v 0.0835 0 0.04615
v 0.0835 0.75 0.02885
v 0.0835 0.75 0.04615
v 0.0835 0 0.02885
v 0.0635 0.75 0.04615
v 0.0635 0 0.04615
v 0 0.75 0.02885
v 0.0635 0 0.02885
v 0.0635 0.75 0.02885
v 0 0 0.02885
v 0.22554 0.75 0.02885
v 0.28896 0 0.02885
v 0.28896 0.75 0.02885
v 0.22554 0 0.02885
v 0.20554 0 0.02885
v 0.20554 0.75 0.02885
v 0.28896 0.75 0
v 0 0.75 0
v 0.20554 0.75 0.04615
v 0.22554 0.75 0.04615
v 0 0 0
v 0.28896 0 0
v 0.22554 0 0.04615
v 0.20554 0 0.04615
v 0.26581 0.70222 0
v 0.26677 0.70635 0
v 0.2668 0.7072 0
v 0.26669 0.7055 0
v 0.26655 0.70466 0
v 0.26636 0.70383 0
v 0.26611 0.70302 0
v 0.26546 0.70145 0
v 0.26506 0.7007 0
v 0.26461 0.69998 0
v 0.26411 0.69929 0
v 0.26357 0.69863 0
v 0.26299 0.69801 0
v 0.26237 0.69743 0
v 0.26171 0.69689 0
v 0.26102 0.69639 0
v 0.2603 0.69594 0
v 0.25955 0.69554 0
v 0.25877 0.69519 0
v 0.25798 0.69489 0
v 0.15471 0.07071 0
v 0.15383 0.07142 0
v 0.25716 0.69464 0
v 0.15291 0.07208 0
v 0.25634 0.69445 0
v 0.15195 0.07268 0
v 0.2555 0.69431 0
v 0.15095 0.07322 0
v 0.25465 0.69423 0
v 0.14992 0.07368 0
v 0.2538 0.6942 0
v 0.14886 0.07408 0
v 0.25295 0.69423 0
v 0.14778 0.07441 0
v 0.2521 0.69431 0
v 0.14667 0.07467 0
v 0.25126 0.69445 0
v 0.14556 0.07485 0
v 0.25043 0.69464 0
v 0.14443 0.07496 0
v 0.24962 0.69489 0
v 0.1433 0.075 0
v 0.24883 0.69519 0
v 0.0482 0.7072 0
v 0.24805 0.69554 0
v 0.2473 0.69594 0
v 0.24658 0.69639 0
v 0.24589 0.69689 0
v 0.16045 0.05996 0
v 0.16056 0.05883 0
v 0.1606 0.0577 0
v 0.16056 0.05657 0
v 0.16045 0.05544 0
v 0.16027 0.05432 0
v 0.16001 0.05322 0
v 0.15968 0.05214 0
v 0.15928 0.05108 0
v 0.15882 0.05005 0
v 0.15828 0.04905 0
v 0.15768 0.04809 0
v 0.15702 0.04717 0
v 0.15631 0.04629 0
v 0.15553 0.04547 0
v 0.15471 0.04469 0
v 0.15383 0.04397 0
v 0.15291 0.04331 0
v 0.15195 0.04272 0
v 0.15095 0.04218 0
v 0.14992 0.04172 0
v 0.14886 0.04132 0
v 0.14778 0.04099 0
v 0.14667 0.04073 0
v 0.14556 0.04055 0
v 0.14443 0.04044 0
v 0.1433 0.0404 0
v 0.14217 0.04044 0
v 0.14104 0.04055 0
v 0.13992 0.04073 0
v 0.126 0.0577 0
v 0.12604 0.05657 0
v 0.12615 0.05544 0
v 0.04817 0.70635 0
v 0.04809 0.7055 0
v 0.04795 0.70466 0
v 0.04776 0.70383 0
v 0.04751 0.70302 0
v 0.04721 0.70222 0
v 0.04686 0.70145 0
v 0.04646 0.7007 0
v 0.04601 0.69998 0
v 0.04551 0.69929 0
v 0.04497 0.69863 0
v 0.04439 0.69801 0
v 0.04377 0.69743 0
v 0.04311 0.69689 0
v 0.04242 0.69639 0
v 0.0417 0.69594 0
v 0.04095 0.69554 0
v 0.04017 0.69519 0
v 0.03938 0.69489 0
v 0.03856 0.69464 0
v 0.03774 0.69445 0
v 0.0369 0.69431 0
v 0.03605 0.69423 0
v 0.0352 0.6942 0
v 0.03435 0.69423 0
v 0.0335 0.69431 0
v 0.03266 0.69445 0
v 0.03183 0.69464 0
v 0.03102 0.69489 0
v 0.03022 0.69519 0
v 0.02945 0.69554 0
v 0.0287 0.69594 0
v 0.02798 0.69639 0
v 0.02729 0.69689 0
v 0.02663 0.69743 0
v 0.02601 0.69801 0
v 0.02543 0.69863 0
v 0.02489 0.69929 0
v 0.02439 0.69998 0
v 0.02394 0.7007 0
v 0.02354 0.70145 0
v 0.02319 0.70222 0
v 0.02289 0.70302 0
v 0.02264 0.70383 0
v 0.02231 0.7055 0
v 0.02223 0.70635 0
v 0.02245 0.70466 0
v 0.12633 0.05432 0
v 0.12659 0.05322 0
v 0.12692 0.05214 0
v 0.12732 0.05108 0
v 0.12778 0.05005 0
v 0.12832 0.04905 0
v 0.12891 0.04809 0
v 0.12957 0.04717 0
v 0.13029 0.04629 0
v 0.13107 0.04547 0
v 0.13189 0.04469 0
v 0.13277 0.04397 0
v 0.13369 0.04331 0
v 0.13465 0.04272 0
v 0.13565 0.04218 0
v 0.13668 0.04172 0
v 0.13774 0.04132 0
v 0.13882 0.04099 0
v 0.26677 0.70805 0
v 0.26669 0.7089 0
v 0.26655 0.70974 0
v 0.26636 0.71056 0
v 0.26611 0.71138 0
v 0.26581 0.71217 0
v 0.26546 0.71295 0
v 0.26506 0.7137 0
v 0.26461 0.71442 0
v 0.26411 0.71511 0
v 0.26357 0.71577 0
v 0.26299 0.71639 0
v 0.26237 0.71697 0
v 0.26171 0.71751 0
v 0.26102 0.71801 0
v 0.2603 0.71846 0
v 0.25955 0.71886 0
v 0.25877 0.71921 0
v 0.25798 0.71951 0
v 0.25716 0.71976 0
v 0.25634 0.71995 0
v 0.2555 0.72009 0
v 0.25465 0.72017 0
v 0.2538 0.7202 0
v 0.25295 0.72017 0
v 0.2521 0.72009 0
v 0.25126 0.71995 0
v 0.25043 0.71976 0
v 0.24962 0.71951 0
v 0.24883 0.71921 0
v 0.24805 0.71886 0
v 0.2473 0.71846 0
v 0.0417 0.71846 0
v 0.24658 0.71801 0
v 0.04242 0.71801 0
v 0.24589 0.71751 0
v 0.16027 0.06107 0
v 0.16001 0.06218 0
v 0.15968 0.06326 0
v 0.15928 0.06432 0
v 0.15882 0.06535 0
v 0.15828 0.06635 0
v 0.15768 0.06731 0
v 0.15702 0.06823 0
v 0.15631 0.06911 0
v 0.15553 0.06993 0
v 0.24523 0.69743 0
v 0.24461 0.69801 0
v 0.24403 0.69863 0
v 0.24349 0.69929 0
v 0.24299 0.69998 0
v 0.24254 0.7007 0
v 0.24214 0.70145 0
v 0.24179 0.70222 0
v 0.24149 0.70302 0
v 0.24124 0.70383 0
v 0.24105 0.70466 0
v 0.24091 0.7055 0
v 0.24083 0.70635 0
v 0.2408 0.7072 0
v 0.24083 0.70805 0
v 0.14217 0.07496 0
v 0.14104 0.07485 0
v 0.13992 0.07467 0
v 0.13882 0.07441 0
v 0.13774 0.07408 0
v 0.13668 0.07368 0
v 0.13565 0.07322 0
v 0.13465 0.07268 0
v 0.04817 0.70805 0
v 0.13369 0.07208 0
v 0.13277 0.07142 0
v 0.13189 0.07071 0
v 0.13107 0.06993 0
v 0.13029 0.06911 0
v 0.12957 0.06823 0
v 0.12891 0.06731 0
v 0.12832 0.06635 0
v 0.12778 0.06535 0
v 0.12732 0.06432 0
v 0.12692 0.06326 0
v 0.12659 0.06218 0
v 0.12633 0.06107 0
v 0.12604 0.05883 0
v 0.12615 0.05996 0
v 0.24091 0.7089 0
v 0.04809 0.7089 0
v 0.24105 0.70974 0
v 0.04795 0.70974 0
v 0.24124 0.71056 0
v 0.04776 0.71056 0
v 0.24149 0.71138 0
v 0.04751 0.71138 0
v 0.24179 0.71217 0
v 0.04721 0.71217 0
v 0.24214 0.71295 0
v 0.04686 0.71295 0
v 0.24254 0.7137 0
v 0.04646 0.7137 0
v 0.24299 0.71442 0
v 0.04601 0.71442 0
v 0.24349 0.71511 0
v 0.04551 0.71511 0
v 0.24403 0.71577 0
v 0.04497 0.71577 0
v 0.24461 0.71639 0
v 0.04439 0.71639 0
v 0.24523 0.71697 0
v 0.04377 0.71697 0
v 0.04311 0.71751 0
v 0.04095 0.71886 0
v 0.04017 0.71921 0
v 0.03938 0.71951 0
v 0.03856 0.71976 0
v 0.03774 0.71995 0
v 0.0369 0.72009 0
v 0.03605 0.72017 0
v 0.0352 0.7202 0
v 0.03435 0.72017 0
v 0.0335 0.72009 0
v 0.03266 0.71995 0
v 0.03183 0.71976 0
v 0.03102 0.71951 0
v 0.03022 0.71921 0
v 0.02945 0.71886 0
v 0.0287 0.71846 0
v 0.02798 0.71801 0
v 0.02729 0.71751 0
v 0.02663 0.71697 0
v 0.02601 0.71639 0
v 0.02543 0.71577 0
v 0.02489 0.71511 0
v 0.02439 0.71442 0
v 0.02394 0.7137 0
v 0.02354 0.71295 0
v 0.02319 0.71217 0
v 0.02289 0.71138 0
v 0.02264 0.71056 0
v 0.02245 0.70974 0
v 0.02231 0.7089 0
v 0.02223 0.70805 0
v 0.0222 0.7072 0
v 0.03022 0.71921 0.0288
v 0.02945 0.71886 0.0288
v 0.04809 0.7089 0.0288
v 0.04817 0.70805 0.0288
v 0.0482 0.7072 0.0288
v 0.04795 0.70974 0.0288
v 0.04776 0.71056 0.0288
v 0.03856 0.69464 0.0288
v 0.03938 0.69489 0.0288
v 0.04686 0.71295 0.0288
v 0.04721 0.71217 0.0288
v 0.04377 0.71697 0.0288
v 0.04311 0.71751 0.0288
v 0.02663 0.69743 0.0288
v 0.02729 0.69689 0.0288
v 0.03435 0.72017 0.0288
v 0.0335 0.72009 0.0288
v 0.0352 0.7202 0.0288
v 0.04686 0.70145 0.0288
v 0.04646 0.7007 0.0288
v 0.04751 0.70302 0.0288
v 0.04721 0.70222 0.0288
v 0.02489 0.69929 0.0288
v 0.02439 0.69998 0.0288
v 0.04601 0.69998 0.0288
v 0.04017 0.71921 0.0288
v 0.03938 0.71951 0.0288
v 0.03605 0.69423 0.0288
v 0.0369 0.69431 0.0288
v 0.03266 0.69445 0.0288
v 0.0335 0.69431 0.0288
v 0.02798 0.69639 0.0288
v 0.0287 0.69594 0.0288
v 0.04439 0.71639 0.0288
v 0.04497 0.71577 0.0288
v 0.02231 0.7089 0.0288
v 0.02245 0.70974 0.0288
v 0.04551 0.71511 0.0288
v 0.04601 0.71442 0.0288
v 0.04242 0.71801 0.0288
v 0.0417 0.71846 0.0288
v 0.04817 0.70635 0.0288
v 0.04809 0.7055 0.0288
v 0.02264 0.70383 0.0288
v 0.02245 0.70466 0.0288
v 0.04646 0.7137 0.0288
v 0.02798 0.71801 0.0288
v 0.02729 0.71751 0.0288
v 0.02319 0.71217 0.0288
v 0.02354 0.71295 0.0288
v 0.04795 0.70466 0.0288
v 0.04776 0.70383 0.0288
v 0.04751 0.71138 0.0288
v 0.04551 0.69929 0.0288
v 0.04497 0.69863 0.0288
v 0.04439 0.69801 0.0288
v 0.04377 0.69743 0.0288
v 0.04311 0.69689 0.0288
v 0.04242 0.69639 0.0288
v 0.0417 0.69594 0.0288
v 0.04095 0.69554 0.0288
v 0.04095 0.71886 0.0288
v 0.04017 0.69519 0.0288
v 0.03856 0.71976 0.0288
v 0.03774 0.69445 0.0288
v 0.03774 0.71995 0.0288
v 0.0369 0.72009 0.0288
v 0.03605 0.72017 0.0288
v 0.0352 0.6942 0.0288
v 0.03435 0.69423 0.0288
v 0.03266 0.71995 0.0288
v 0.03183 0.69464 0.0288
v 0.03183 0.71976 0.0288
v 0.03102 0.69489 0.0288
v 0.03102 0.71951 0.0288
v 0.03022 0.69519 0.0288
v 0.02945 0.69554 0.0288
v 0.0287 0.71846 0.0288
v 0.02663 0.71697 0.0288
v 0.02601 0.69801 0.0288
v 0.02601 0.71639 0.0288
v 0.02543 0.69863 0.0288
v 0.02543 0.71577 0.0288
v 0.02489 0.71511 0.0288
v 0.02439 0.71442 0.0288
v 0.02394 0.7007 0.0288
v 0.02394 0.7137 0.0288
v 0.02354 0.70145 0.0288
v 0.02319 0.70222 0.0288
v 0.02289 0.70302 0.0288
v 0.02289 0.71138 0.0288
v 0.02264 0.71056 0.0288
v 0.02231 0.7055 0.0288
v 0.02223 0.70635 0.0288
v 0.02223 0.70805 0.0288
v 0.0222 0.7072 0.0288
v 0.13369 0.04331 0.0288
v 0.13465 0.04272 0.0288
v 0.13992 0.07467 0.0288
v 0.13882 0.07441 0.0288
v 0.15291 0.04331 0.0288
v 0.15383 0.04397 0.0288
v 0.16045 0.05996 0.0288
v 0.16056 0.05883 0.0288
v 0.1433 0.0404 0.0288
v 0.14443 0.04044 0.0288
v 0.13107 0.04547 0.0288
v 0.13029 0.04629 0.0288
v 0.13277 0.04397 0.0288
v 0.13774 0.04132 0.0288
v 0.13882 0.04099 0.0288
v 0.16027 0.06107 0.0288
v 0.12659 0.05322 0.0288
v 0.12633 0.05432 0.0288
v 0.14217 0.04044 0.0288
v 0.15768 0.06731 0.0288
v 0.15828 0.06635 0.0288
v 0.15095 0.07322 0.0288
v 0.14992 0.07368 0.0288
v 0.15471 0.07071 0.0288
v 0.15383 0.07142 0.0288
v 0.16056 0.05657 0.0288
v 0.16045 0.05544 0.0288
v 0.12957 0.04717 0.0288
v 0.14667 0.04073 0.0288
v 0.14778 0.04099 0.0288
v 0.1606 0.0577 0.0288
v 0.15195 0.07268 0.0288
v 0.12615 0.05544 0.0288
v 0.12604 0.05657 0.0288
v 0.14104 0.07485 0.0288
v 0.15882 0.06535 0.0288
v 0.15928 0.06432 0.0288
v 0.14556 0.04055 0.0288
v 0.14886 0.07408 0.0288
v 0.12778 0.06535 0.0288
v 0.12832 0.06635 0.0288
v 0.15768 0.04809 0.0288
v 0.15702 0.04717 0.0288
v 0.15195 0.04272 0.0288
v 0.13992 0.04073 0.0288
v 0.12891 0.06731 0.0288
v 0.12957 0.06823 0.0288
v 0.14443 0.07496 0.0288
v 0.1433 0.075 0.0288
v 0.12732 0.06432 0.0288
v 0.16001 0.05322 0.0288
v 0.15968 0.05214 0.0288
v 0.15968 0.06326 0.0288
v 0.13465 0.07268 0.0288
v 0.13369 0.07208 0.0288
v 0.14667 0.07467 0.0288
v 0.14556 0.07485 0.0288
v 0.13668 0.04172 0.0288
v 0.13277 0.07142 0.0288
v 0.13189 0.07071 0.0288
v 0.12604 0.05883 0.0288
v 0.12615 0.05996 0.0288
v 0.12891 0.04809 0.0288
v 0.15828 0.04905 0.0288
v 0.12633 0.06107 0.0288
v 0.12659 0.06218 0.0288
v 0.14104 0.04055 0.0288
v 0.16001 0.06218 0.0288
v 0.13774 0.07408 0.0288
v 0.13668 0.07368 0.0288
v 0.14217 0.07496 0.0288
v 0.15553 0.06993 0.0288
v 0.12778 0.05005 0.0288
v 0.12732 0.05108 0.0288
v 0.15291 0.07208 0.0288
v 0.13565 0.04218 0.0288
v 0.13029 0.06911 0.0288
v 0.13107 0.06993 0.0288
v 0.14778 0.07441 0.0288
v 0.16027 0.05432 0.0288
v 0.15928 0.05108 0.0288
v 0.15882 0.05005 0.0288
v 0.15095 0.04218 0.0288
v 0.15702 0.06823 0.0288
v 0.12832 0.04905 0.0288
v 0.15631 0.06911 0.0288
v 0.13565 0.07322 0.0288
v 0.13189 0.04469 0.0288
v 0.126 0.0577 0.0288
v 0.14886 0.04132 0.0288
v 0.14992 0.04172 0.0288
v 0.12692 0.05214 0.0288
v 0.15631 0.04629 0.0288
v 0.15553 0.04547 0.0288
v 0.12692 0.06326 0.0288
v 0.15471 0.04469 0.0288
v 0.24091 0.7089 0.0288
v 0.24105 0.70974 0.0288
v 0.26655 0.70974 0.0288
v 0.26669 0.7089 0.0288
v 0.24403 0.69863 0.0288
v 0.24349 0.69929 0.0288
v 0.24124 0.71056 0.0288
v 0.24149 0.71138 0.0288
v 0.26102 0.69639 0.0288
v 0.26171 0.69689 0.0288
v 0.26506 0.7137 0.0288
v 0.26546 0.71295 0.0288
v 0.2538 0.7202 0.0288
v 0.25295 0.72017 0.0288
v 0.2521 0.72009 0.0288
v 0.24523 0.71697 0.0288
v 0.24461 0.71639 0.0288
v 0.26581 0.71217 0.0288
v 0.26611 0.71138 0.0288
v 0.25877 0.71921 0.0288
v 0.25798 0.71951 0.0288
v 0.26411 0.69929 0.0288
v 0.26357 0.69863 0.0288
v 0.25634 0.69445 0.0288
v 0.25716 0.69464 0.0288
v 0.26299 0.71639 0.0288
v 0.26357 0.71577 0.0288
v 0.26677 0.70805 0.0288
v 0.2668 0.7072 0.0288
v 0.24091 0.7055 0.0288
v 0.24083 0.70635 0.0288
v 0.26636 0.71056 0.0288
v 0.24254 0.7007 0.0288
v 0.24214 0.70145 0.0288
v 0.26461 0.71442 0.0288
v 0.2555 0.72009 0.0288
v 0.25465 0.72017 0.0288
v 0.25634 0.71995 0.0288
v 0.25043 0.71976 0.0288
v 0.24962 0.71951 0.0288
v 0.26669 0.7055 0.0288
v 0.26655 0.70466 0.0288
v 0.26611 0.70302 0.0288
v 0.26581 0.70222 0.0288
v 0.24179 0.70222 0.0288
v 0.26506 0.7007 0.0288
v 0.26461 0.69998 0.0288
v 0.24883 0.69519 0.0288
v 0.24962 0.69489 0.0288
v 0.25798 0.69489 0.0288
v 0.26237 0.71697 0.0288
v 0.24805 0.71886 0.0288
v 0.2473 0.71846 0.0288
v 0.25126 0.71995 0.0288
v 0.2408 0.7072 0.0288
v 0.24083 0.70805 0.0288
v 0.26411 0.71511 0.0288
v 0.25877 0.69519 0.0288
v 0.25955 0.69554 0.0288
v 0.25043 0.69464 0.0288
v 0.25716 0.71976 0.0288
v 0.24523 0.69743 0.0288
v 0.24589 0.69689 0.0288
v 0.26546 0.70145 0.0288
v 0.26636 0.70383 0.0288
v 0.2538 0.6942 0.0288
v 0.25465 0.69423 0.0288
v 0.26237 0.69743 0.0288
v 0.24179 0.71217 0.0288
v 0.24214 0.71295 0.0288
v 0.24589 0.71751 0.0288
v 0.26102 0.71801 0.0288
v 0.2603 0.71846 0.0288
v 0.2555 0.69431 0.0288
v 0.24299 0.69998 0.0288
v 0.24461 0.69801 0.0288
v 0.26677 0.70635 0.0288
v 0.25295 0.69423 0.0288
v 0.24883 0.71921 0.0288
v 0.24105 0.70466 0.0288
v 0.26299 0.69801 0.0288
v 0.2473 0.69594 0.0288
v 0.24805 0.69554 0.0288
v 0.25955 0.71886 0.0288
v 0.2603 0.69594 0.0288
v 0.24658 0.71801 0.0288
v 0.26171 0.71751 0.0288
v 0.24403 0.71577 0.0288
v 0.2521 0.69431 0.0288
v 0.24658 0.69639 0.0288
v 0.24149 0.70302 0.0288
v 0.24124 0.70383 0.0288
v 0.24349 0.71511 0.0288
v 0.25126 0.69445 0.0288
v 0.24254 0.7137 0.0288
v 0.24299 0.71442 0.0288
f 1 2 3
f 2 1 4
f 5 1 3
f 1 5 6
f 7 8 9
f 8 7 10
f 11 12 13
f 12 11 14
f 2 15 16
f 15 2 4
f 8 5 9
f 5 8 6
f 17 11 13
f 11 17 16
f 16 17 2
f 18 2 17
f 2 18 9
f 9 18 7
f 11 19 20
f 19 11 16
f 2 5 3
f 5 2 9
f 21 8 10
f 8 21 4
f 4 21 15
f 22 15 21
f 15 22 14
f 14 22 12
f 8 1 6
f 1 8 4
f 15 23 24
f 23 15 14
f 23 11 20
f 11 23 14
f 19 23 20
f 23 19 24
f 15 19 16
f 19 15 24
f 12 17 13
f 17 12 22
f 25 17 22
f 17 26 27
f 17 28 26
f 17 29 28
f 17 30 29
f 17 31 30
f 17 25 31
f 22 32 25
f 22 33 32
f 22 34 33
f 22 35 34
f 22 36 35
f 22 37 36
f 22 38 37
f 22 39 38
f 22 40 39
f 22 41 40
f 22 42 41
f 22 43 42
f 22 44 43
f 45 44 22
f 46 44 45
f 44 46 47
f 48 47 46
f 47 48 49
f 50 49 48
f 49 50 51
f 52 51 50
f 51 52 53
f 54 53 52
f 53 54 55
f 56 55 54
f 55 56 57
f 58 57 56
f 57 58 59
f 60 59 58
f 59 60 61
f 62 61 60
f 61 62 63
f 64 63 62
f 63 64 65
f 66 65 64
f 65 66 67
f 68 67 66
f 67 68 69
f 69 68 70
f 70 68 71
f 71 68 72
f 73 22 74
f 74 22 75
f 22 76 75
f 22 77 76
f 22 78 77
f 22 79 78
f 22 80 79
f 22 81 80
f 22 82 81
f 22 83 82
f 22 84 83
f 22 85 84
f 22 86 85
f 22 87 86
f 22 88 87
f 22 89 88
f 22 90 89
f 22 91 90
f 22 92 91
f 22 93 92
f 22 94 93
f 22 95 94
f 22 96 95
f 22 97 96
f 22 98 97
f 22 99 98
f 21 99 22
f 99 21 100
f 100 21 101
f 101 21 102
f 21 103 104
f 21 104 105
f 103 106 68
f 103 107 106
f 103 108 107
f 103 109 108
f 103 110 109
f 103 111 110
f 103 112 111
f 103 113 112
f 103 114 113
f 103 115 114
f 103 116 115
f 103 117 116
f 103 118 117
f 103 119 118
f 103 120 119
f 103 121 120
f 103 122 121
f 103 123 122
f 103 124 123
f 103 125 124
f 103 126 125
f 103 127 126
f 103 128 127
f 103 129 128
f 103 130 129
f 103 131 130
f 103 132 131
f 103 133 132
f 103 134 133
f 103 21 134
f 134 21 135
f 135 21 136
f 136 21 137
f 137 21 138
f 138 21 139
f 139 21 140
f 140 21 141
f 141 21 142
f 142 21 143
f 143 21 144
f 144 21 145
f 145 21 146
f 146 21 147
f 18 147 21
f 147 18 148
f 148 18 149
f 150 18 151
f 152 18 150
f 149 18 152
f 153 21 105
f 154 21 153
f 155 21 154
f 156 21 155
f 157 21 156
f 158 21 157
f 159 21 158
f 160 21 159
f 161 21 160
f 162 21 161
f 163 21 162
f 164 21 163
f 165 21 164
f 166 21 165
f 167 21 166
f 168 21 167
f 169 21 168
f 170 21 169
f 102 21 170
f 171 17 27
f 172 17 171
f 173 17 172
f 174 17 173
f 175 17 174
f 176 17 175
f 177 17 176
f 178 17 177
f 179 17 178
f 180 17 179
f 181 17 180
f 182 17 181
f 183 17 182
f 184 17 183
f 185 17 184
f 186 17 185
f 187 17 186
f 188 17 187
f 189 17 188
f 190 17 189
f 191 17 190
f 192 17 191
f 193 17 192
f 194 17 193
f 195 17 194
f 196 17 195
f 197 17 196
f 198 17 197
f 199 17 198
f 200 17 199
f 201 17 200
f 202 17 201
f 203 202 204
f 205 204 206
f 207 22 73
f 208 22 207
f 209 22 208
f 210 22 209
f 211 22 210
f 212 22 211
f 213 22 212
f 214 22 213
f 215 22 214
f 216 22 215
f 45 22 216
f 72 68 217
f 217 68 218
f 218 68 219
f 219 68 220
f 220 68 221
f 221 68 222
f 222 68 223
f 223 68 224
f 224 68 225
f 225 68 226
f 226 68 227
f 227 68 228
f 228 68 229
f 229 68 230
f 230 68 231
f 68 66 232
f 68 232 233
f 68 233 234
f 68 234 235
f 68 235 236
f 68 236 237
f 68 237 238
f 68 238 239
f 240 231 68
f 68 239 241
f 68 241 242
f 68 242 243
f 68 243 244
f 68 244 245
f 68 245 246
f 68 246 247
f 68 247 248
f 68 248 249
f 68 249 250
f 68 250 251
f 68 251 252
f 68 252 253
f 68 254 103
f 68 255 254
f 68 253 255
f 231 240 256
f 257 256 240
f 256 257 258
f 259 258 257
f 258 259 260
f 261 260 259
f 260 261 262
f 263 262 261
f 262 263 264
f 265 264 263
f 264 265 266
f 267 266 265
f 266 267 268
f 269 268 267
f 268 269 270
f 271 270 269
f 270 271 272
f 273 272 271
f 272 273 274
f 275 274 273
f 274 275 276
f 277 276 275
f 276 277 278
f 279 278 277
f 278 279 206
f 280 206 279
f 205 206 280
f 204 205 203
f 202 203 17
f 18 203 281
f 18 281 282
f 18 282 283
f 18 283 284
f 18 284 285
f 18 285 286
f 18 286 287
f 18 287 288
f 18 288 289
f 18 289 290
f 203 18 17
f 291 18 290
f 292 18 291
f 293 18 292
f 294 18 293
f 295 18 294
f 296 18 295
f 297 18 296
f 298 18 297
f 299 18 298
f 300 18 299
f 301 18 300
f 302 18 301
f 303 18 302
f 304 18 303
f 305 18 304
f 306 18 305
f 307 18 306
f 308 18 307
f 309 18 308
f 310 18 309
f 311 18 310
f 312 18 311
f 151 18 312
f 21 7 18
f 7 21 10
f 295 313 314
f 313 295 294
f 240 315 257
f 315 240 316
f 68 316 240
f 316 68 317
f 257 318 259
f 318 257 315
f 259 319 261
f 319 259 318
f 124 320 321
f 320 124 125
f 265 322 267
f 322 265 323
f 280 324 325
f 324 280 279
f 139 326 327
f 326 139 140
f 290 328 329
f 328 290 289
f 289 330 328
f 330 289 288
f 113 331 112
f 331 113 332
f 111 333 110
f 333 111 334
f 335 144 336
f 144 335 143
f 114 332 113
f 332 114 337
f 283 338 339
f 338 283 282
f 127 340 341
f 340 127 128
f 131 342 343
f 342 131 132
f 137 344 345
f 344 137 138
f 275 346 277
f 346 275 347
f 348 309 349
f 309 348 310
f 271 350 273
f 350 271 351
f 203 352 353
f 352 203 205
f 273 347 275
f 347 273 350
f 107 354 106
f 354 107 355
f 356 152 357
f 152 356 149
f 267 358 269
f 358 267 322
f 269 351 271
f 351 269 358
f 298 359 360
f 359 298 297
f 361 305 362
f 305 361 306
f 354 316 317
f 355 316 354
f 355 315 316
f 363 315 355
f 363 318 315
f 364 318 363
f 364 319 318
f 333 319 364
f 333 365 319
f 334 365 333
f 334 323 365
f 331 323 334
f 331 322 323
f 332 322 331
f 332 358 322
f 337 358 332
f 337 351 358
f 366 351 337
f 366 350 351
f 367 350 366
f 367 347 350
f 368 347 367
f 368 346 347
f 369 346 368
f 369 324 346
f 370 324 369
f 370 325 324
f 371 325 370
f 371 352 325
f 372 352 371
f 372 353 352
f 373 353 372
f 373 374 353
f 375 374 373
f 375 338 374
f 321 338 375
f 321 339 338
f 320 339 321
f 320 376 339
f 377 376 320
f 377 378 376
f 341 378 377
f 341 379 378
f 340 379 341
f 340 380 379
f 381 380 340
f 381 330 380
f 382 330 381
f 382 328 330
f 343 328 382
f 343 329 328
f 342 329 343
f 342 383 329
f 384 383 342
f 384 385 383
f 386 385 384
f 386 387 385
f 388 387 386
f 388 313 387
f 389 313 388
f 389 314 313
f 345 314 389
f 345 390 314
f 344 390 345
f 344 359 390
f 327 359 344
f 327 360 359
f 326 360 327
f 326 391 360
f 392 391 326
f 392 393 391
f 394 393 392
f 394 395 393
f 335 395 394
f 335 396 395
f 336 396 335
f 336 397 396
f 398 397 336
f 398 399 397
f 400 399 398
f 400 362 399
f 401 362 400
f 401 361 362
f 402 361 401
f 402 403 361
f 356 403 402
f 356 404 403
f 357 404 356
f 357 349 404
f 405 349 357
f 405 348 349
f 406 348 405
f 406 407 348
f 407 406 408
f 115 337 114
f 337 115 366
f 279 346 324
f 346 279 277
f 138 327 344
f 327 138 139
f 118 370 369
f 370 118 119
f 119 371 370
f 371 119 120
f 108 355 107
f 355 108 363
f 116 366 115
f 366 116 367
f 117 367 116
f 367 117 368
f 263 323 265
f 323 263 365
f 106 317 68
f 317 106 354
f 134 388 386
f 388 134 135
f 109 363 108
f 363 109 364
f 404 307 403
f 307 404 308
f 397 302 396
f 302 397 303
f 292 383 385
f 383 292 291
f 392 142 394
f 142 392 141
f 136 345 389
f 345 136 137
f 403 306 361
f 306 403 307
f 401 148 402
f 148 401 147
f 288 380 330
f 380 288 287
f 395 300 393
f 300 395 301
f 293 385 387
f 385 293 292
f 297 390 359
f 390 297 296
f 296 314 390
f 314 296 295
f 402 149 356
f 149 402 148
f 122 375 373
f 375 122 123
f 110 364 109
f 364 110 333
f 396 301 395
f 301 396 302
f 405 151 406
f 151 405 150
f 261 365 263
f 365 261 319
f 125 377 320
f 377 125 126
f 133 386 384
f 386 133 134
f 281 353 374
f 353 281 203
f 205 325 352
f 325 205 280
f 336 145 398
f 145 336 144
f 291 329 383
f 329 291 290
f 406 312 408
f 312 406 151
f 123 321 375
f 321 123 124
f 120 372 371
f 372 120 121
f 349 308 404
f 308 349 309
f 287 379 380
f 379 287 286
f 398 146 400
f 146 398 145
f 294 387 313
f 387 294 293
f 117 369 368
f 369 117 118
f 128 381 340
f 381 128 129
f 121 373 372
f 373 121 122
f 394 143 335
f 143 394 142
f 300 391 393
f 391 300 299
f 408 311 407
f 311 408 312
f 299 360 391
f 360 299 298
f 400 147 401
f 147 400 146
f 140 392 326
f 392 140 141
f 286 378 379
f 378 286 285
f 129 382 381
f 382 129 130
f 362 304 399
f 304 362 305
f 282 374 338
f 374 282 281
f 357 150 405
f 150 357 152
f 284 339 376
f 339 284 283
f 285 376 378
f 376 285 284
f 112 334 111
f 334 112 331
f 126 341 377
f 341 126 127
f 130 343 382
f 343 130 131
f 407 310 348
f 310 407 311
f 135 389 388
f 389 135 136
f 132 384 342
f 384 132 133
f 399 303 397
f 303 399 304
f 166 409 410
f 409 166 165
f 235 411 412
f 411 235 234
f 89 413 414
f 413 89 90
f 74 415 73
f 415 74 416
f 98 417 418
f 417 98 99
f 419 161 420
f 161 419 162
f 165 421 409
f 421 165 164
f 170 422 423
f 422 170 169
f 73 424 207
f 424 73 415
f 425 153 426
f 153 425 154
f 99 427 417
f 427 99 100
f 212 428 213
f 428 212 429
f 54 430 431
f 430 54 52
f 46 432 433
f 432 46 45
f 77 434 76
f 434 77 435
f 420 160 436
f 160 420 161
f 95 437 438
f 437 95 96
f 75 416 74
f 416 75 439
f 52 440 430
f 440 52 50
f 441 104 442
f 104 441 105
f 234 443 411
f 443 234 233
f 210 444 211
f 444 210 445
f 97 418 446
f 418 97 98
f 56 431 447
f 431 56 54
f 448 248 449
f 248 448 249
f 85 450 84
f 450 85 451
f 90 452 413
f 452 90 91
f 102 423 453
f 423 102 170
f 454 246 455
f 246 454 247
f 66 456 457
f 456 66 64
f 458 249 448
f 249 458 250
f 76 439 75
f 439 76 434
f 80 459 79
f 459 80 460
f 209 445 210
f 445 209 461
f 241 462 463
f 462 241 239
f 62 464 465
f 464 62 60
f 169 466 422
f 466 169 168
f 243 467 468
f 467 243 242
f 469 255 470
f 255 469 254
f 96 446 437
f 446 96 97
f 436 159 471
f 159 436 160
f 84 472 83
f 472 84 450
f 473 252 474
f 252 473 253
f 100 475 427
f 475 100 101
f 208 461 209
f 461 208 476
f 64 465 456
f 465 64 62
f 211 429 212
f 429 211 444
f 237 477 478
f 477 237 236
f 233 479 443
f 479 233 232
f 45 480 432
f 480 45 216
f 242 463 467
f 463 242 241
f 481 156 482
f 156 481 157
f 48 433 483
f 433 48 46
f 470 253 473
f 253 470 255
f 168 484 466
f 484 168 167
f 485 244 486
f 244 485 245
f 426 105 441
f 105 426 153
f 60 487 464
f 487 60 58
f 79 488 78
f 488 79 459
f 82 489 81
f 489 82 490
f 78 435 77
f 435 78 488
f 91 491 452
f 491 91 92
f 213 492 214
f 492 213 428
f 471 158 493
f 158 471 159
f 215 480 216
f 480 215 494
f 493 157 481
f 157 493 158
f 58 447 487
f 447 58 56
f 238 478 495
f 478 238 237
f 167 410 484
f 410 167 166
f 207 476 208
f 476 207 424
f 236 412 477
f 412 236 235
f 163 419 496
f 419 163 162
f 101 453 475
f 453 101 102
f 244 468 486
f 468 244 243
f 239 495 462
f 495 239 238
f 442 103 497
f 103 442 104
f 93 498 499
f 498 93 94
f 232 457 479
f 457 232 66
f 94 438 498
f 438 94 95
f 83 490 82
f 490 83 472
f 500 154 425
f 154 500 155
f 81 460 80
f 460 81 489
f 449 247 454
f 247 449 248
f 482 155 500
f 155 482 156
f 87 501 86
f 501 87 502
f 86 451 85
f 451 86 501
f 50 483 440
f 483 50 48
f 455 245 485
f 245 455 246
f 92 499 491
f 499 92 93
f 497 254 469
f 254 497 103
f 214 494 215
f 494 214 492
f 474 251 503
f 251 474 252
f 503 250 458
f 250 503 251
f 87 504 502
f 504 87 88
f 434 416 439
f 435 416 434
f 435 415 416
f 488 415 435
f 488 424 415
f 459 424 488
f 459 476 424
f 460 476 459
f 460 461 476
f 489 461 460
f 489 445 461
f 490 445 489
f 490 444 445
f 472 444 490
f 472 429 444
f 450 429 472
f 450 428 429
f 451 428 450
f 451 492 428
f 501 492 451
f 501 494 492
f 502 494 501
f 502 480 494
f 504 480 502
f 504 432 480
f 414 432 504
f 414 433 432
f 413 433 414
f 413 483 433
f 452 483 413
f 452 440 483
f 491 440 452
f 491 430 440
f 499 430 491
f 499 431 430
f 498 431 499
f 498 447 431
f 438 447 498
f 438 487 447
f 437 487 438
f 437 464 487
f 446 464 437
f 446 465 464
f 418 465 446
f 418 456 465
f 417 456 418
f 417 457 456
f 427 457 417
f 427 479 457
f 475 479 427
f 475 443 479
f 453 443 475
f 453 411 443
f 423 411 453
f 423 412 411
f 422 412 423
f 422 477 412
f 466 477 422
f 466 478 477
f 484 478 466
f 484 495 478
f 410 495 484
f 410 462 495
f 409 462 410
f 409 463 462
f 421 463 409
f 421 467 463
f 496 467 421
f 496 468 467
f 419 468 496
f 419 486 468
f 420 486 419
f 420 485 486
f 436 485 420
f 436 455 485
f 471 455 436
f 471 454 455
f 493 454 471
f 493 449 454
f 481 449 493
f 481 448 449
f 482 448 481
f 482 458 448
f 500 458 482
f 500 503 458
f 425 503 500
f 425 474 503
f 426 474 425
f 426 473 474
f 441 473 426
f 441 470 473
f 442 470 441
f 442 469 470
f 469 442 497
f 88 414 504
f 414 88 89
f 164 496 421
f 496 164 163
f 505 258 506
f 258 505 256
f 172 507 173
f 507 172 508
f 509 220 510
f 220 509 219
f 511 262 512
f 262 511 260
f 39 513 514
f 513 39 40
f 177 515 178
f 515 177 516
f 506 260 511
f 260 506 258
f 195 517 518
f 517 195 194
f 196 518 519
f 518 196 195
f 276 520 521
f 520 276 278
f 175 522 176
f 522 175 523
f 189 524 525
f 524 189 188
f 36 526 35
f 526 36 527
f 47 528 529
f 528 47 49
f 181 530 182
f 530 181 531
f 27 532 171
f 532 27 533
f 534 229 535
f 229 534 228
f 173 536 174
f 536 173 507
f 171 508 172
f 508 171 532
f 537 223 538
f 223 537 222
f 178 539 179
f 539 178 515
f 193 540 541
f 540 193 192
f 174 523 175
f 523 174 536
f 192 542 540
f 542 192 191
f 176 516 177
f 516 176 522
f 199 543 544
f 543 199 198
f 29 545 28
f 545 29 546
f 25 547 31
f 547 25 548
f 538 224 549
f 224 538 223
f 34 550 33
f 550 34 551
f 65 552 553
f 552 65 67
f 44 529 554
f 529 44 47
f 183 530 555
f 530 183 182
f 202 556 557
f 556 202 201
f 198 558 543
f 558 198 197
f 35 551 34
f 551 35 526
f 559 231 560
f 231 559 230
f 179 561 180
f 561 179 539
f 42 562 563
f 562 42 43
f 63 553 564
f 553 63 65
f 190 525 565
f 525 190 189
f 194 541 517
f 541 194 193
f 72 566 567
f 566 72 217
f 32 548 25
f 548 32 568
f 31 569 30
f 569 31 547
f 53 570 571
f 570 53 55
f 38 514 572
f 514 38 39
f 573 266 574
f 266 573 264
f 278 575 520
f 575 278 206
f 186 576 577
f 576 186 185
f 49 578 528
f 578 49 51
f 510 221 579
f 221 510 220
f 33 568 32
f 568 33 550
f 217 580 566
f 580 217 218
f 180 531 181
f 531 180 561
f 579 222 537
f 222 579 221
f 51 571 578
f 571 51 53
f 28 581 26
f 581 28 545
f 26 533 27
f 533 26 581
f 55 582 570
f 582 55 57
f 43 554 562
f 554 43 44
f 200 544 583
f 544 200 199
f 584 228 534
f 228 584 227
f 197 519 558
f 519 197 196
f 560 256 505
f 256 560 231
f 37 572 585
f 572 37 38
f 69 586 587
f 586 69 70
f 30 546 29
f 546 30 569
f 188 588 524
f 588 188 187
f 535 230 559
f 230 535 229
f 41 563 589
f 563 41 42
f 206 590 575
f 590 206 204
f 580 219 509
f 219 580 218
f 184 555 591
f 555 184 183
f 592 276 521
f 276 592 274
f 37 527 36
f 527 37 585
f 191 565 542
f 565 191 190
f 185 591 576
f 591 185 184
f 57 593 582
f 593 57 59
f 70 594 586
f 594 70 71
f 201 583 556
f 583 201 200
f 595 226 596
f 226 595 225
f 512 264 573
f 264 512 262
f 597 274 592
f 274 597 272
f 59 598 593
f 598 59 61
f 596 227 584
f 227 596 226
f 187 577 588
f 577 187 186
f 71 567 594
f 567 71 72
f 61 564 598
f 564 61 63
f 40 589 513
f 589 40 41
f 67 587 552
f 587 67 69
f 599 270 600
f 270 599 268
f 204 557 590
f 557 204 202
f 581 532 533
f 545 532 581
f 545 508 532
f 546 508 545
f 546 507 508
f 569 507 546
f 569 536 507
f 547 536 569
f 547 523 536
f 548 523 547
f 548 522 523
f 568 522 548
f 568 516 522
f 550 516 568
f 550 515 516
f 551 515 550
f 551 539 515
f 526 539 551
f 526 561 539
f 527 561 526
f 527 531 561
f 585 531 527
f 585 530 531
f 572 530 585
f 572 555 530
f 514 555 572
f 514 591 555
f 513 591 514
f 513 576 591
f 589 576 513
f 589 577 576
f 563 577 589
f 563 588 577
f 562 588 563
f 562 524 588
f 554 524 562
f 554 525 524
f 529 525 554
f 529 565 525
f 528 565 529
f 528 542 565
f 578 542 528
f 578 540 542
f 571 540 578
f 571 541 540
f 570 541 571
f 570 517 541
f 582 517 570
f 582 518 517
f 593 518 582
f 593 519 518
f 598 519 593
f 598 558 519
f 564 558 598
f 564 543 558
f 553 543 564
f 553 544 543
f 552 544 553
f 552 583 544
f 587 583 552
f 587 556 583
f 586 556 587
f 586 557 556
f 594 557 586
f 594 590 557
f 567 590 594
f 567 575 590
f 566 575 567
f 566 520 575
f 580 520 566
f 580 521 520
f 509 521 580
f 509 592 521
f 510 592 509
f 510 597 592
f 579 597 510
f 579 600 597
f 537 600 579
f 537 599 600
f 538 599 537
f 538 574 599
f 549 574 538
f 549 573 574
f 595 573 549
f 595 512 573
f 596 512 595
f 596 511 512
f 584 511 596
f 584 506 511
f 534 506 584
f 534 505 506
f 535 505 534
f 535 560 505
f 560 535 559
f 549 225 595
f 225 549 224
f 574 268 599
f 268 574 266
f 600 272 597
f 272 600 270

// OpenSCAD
// ============================================================
// Parametric stepped-hole base plate with paired ribs
// All dimensions in the original (unit-less) source units
// ============================================================

// ---- Base solid ----
base_len    = 0.28896;     // X
base_wid    = 0.75;        // Y
base_hgt    = 0.028846;    // Z (underside z=0, top z=base_hgt)

// ---- Rib pad (two ribs running full Y) ----
rib_band_x  = 0.162037;    // outside footprint in X
rib_edge_off= 0.0635;      // offset from left/right of base to rib band
rib_height  = 0.017308;    // rises above base top
rib_width   = 0.020;       // individual rib thickness in X (assumed)

// ---- Hole axis locations (left offset = X, front offset = Y) ----
hole1_r = 0.013;   hole1_x = 0.0352;  hole1_y = 0.7072;
hole2_r = 0.0173;  hole2_x = 0.1433;  hole2_y = 0.0577;
hole3_r = 0.013;   hole3_x = 0.2538;  hole3_y = 0.7072;

// ---- Stepped cut Z-extents (relative to base underside z=0) ----
upper_recess_z_lo = 0.0057;   // shallow recess bottom
upper_recess_z_hi = 0.0288;   // shallow recess top (= base top)
deep_cut_z_hi     = 0.0288;   // deep cut top
deep_cut_z_lo     = -0.1154;  // deep cut bottom (passes through underside)

$fn = 96;

// ------------------------------------------------------------
// Module: a pair of ribs along Y, occupying outer edges of band
// ------------------------------------------------------------
module rib_pair() {
    // Left rib
    translate([rib_edge_off, 0, base_hgt])
        cube([rib_width, base_wid, rib_height]);
    // Right rib
    translate([rib_edge_off + rib_band_x - rib_width, 0, base_hgt])
        cube([rib_width, base_wid, rib_height]);
}

// ------------------------------------------------------------
// Module: stepped circular cut (shallow recess + deep through cut)
// ------------------------------------------------------------
module stepped_hole(x, y, r) {
    // Shallow upper recess stage
    translate([x, y, upper_recess_z_lo])
        cylinder(h = upper_recess_z_hi - upper_recess_z_lo, r = r);
    // Deeper aligned cut stage (through and below)
    translate([x, y, deep_cut_z_lo])
        cylinder(h = deep_cut_z_hi - deep_cut_z_lo, r = r);
}

// ------------------------------------------------------------
// Main assembly
// ------------------------------------------------------------
difference() {
    union() {
        // Base solid
        cube([base_len, base_wid, base_hgt]);
        // Two lengthwise ribs on top face
        rib_pair();
    }
    // Three stepped circular removals
    stepped_hole(hole1_x, hole1_y, hole1_r);
    stepped_hole(hole2_x, hole2_y, hole2_r);
    stepped_hole(hole3_x, hole3_y, hole3_r);
}
